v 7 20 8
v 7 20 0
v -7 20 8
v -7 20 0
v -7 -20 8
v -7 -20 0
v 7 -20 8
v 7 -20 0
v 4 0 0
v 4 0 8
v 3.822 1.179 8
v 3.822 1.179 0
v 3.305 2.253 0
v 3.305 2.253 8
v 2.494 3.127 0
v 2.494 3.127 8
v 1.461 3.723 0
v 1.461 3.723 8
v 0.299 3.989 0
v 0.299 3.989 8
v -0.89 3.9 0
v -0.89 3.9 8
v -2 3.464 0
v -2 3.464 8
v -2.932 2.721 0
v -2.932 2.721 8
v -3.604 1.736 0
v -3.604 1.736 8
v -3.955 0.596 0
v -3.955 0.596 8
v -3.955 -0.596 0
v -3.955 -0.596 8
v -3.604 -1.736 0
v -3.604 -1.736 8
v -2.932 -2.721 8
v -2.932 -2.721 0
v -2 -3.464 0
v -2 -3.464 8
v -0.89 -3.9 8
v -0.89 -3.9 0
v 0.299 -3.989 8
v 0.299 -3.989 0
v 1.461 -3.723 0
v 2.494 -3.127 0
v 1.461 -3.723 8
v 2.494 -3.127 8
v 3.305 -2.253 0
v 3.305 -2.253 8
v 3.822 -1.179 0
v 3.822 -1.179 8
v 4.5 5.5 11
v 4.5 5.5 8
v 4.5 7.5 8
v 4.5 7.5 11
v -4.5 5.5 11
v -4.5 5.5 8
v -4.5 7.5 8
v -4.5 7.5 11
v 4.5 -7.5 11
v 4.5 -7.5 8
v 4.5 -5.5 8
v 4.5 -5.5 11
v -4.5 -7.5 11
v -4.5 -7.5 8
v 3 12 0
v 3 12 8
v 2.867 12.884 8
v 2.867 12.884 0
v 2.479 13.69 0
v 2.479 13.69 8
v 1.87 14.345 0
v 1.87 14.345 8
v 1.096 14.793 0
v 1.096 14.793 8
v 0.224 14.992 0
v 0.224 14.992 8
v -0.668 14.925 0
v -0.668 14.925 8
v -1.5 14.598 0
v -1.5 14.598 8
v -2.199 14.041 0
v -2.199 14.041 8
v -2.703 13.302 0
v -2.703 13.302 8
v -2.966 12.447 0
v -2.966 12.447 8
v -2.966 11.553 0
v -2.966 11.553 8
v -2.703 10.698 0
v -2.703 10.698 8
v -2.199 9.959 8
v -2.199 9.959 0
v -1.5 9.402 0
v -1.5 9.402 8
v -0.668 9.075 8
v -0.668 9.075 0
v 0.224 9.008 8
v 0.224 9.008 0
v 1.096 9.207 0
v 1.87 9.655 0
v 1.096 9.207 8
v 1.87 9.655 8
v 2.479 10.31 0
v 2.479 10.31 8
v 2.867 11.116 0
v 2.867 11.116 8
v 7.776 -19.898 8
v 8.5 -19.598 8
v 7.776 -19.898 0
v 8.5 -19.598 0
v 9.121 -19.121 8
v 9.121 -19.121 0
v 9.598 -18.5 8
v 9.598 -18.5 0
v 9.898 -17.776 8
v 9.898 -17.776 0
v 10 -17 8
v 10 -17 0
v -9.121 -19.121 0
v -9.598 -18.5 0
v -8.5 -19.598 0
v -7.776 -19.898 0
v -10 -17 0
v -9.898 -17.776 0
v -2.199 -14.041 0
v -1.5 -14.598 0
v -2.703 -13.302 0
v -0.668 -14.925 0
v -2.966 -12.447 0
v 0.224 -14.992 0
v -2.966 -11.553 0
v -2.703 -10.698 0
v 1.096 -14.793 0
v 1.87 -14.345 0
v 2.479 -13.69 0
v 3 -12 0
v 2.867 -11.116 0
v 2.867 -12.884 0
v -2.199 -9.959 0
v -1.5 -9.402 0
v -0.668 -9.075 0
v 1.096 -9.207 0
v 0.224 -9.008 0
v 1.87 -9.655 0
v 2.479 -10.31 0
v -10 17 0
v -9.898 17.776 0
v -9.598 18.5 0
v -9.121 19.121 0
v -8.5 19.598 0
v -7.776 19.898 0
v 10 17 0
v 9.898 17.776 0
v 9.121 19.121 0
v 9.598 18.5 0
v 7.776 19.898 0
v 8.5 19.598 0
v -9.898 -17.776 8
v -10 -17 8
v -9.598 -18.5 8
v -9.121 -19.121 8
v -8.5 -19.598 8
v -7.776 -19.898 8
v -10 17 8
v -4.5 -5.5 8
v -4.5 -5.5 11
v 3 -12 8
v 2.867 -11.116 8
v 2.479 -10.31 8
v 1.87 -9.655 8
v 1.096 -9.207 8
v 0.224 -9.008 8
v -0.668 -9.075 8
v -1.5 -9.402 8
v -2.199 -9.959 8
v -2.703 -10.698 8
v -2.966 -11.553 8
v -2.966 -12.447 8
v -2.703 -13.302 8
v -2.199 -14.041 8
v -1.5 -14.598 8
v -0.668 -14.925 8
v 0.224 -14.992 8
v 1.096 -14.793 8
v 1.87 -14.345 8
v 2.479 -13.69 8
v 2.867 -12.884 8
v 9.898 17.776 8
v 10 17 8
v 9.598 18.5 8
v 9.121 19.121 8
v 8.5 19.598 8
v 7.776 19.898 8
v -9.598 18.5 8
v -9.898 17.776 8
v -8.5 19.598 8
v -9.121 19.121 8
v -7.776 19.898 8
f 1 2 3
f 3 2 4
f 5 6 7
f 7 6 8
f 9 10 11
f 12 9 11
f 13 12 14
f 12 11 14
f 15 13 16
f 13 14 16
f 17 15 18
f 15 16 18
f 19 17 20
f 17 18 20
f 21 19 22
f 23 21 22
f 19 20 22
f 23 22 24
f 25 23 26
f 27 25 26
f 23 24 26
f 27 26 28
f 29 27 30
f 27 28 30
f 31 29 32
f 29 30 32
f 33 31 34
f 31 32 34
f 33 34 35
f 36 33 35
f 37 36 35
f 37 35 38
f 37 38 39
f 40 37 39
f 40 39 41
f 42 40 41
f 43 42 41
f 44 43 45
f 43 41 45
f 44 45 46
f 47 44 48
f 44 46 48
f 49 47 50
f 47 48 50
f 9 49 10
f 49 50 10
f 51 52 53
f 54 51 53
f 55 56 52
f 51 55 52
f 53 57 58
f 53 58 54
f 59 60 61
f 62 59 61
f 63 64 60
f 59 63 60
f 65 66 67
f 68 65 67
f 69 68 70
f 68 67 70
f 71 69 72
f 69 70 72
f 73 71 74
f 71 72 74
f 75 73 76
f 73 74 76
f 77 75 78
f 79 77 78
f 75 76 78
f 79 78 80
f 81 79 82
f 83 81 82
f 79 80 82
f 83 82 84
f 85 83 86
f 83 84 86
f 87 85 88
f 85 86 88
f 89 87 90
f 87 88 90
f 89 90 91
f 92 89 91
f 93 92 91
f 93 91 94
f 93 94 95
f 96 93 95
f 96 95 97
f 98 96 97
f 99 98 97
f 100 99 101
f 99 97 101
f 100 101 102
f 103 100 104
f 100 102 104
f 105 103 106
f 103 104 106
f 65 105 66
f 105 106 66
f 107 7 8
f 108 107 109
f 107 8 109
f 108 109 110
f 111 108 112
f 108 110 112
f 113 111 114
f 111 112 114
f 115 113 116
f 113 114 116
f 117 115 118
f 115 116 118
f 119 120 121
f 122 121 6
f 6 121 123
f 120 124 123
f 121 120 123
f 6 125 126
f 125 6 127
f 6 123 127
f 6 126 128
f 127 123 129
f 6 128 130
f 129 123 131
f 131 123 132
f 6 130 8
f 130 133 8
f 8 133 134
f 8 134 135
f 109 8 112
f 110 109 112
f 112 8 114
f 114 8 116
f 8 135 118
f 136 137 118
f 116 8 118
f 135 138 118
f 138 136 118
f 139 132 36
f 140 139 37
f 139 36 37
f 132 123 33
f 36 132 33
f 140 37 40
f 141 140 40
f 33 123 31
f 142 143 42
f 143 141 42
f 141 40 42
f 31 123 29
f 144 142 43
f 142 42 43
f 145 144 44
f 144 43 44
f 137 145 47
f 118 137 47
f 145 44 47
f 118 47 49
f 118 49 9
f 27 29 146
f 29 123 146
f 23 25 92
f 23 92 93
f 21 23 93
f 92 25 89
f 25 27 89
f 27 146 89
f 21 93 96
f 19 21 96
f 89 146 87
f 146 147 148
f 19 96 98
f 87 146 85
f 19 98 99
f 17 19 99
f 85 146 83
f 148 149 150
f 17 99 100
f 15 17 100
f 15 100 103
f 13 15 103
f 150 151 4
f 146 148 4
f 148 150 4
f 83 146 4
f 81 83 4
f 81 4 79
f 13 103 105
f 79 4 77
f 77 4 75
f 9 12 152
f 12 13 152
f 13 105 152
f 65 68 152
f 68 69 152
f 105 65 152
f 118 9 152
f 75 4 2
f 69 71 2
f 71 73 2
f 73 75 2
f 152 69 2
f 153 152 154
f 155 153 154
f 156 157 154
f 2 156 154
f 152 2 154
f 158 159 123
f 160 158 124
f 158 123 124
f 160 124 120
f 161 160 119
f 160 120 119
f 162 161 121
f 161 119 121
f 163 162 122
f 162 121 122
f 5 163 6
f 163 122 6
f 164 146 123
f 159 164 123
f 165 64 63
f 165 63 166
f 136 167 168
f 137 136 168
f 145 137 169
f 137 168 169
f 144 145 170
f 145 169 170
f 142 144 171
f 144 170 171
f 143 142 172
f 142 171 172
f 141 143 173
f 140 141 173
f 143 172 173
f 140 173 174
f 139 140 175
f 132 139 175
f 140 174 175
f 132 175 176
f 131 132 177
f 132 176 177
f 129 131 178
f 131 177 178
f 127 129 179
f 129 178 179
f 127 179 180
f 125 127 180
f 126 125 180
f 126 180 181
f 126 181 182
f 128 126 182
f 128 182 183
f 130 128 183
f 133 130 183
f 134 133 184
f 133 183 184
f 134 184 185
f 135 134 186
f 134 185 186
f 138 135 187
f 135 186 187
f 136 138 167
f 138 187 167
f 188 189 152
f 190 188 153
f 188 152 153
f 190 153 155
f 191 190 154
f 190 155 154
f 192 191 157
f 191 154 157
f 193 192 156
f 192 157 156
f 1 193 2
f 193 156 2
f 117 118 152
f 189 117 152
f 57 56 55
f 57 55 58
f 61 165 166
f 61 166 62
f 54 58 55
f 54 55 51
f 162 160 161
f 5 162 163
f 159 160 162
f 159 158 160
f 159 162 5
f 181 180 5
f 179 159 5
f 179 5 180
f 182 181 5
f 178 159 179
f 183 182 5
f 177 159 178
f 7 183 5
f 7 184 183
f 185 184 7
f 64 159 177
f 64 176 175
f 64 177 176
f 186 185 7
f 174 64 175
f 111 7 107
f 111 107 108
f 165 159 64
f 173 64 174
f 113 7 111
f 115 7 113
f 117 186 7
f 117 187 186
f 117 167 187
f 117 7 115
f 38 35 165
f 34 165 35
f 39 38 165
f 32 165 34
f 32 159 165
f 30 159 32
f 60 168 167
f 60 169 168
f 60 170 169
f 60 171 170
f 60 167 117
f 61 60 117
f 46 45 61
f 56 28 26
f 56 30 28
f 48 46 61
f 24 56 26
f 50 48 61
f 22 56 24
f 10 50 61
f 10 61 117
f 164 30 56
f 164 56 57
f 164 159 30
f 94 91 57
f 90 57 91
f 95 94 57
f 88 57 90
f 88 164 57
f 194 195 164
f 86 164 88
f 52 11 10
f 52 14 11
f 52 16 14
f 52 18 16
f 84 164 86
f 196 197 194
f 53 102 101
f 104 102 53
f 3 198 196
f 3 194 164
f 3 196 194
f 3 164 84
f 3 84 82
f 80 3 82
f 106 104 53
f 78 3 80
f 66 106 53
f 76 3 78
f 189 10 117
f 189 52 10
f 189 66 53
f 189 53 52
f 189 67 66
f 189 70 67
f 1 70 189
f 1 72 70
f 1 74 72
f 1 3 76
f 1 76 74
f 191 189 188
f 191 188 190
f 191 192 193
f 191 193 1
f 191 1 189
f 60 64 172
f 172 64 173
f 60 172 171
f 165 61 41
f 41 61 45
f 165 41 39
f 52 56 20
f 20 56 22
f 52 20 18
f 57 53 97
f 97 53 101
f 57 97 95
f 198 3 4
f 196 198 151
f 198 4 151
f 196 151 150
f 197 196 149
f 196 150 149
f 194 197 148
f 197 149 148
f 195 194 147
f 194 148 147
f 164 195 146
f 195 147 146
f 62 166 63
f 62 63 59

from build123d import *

# Parameters (mm, degrees)
F1_DEPTH = 8
F2_R     = 3
F3_DEPTH = 8
F4_R     = 4
F5_DEPTH = 8
F6_W     = 9
F6_H     = 2
F7_DEPTH = 3


with BuildPart() as f1:
    # F0 (on Top) → F1 (new body)
    with BuildSketch(Plane.XY):
        with BuildLine():
            Line((7, 20), (-7, 20))
            ThreePointArc((-7, 20), (-9.12132, 19.12132), (-10, 17))
            Line((-10, 17), (-10, -17))
            ThreePointArc((-10, -17), (-9.12132, -19.12132), (-7, -20))
            Line((-7, -20), (7, -20))
            ThreePointArc((7, -20), (9.12132, -19.12132), (10, -17))
            Line((10, -17), (10, 17))
            ThreePointArc((10, 17), (9.12132, 19.12132), (7, 20))
        make_face()
    extrude(amount=F1_DEPTH)

    # F2 (on face) → F3 (cut, through all)
    with BuildSketch(Plane.XY.offset(8)):
        with Locations((0, 12)):
            Circle(F2_R)
        with Locations((0, -12)):
            Circle(F2_R)
    extrude(amount=-F3_DEPTH, mode=Mode.SUBTRACT)

    # F4 (on face) → F5 (cut, through all)
    with BuildSketch(Plane.XY.offset(8)):
        Circle(F4_R)
    extrude(amount=-F5_DEPTH, mode=Mode.SUBTRACT)

    # F6 (on face) → F7 (join)
    with BuildSketch(Plane.XY.offset(8)):
        with Locations((0, -6.5)):
            Rectangle(F6_W, F6_H)
        with Locations((0, 6.5)):
            Rectangle(F6_W, F6_H)
    extrude(amount=F7_DEPTH)


solid = f1.part
